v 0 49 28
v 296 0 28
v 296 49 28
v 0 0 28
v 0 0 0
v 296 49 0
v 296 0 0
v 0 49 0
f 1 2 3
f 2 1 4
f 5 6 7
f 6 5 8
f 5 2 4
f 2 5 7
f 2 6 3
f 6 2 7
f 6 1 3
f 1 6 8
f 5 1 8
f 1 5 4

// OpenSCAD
include <../src/wardrobe.scad>;
plank_zy_middle();
//github_openscad -o wardrobe_1/plank_zy_middle.stl -D wardrobe_n=1 -D cutting_edge=0 -D break_view_length=0 wardrobe_1/plank_zy_middle_stl.scad
